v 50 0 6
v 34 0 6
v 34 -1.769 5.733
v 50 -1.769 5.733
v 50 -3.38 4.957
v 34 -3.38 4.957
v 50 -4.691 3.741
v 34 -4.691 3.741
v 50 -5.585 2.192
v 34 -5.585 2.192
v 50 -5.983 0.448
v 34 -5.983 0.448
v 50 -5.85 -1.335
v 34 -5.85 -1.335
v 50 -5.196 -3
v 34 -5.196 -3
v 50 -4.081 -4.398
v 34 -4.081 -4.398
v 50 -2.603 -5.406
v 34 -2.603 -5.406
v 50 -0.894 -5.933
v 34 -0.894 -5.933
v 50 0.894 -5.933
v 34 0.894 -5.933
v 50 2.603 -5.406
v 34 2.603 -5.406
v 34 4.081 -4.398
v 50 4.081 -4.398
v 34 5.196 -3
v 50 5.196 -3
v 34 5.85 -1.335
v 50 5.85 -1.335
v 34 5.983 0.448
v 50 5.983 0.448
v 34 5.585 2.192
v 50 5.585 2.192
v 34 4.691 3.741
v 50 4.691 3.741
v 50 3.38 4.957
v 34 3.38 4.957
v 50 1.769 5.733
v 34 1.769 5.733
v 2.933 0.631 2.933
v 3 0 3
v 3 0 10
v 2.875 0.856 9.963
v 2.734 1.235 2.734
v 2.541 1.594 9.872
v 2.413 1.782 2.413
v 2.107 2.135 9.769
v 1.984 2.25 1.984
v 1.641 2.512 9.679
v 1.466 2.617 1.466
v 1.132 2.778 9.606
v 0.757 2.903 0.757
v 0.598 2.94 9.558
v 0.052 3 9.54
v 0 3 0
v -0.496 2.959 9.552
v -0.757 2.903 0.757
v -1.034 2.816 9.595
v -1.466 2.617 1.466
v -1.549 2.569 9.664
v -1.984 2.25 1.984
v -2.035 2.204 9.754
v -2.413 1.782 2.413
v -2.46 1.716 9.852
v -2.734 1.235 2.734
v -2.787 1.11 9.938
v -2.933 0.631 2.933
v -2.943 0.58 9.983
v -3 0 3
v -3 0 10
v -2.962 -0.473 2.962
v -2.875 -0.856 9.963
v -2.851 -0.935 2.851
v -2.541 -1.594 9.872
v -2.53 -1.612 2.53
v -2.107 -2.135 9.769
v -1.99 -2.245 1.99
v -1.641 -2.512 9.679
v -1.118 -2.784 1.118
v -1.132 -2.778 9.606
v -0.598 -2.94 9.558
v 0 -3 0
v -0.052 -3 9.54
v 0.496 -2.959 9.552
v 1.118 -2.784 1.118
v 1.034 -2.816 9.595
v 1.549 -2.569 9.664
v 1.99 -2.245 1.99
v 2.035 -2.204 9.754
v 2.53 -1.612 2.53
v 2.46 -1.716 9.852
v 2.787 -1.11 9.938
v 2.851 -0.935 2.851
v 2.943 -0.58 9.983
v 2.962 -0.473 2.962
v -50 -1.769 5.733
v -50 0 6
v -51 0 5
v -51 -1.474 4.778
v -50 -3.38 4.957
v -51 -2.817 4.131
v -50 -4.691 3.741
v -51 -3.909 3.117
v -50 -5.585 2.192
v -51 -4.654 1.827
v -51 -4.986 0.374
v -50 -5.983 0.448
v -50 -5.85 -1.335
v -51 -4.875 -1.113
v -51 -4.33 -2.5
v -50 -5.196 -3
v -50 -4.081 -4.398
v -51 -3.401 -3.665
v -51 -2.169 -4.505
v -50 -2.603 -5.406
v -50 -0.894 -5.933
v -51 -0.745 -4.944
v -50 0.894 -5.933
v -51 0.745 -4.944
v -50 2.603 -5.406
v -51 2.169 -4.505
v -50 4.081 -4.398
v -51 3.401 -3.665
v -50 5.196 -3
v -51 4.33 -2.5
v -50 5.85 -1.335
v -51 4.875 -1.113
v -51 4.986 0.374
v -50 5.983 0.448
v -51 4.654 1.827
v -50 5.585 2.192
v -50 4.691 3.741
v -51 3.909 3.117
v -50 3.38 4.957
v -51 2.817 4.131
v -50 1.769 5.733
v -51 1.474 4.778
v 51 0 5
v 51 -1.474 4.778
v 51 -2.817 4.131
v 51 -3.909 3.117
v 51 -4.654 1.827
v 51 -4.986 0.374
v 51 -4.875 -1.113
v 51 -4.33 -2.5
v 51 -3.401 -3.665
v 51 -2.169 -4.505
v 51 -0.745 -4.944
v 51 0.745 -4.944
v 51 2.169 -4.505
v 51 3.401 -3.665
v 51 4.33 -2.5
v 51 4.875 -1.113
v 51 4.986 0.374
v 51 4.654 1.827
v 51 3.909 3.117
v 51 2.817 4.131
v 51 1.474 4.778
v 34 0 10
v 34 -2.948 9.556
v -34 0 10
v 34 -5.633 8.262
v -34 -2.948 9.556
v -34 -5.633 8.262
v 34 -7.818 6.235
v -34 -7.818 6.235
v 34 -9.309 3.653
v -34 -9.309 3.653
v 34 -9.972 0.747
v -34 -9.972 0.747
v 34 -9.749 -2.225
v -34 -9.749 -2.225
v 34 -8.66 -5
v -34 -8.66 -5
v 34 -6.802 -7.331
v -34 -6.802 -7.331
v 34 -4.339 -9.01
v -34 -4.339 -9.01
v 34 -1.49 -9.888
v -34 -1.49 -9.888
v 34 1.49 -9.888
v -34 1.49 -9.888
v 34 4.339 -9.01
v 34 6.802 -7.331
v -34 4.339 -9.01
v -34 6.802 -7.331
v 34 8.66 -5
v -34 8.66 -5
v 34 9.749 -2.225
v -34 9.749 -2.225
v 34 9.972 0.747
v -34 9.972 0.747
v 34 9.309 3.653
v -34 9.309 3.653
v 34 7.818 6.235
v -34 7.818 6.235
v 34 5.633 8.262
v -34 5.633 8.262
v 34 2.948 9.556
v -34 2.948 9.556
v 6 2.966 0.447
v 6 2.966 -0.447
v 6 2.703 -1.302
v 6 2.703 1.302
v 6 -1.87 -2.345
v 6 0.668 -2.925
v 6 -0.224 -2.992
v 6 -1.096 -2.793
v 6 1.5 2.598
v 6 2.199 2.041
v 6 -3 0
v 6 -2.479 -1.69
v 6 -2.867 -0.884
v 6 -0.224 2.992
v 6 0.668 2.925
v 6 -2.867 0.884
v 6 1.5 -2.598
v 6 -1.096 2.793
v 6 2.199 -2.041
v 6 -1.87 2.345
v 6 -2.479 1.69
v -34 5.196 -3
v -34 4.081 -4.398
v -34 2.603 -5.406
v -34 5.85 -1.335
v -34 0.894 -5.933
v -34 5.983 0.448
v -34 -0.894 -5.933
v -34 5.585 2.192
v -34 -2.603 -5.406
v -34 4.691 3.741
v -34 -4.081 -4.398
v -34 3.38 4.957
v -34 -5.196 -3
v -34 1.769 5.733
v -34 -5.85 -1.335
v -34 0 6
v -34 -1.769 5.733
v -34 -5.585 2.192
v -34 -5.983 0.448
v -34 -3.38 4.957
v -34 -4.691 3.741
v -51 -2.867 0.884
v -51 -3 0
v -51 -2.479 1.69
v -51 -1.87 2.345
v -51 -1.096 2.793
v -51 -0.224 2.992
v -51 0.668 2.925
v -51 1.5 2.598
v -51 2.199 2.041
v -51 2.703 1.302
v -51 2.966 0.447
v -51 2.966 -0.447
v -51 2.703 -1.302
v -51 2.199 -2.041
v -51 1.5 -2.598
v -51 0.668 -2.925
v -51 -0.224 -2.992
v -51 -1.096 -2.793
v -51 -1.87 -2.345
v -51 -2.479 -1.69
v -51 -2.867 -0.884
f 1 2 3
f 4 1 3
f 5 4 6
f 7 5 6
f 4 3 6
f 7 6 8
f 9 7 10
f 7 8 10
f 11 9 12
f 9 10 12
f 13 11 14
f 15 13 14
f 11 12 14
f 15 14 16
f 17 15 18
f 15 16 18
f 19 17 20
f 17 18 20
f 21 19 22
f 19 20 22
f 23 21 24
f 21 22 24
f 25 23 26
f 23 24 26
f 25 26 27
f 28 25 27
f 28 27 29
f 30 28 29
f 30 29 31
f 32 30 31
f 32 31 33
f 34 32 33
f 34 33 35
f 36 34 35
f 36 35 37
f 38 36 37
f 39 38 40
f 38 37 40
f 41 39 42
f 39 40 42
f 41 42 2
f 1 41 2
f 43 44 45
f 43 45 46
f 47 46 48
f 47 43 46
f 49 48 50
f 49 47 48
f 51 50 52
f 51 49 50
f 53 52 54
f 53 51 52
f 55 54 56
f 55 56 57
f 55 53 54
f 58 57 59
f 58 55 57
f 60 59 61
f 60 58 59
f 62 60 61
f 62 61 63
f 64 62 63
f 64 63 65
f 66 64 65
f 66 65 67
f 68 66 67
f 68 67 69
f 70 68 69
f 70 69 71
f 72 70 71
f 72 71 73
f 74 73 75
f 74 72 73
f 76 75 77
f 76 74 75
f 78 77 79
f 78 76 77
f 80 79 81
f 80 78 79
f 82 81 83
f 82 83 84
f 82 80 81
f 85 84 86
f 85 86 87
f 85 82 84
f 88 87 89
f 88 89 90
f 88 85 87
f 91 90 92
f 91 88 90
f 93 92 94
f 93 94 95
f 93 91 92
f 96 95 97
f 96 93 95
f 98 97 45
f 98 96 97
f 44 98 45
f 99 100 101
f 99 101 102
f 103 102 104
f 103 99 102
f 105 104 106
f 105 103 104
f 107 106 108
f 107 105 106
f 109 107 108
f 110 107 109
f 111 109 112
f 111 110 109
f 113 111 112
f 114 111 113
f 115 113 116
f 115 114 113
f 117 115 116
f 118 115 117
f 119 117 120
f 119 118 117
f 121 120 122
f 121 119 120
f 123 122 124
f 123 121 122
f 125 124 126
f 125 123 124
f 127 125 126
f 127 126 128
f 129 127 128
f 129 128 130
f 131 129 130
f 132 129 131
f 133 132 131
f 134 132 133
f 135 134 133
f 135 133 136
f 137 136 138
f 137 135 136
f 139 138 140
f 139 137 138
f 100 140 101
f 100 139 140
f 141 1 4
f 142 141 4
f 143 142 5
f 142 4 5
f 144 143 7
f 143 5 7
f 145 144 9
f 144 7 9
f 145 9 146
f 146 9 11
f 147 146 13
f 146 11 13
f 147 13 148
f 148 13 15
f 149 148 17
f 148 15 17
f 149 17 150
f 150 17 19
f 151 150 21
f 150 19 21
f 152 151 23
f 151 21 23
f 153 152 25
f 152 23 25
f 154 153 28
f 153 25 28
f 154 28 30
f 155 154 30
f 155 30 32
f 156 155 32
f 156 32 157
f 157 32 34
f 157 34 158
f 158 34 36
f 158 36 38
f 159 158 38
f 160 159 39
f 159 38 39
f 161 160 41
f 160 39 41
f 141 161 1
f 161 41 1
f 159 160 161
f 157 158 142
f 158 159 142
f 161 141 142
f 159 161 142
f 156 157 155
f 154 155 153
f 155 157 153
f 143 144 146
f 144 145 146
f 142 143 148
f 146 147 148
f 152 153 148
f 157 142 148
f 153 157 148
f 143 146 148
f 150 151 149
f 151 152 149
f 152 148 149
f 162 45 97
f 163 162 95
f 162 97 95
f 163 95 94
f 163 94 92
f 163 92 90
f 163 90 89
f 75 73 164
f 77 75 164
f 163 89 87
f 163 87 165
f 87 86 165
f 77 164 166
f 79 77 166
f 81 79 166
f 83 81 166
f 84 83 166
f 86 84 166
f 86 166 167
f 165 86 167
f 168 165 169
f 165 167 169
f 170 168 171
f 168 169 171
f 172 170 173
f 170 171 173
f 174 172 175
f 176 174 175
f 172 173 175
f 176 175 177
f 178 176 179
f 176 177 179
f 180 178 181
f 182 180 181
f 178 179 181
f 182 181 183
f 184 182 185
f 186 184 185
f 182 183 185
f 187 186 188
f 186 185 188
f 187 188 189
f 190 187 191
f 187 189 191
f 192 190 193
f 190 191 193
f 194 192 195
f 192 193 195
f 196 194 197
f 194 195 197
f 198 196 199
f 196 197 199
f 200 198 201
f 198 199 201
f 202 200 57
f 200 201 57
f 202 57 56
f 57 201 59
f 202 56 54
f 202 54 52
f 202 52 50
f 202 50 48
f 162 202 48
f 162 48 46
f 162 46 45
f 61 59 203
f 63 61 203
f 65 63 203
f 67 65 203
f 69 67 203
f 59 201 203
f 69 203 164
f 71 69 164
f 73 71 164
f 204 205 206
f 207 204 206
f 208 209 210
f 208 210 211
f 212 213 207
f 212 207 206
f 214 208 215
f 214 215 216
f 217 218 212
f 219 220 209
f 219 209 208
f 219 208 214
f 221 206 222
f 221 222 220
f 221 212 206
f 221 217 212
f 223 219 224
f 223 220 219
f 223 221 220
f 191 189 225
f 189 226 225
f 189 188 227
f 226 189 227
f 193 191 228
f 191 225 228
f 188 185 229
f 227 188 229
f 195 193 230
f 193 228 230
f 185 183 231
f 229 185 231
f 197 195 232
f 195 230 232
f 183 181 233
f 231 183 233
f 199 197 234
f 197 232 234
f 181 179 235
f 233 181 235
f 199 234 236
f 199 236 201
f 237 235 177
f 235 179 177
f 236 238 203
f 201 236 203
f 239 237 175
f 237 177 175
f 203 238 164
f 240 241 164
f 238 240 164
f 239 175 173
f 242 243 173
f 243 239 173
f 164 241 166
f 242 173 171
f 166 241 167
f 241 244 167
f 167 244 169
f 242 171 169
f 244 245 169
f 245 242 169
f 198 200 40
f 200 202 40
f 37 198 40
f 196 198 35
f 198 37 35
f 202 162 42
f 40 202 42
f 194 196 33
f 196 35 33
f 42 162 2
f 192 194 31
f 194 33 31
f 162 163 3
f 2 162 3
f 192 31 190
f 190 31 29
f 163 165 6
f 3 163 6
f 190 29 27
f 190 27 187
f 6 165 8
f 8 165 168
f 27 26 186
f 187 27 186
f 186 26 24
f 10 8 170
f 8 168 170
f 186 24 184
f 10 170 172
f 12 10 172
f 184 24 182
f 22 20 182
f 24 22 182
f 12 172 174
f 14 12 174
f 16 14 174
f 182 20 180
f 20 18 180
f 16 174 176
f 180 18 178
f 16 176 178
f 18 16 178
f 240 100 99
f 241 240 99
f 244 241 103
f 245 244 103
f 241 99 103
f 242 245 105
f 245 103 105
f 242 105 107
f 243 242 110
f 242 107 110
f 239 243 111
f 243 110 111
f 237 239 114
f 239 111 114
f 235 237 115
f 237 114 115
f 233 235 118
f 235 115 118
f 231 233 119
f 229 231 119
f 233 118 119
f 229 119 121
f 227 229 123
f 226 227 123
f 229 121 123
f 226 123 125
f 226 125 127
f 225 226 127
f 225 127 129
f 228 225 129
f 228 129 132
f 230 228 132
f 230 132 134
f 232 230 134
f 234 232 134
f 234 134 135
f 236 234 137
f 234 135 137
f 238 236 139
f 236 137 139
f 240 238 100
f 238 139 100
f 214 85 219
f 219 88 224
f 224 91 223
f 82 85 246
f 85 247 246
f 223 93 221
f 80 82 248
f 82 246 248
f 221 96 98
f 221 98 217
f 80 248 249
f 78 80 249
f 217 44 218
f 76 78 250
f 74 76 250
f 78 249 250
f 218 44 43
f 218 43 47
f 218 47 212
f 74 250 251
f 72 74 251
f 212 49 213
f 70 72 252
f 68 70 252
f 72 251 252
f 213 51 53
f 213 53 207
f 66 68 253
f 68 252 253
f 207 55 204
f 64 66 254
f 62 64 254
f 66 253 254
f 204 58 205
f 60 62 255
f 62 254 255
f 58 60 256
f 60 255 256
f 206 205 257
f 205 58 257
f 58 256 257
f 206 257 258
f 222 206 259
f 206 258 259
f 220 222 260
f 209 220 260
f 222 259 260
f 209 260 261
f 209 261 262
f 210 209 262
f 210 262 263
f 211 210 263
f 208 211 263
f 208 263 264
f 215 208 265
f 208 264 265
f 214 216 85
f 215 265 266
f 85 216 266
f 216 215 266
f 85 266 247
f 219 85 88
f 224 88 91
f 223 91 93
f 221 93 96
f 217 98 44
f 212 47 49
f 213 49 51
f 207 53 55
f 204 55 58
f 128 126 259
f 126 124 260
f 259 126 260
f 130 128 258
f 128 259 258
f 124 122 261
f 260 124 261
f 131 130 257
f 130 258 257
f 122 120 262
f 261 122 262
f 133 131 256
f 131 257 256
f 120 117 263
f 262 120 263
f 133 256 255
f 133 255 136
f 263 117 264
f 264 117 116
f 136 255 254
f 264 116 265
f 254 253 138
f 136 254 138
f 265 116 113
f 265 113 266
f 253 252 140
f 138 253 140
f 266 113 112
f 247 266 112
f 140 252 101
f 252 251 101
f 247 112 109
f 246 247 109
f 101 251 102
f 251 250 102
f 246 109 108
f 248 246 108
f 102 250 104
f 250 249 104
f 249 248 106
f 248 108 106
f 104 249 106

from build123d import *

# Parameters (mm, degrees)
F2_SIZE  = 1
F3_R     = 3
F4_DEPTH = 57
F5_R     = 3
F6_DEPTH = 32


with BuildPart() as f1:
    # F0 (on Front) → F1 (revolve)
    with BuildSketch(Plane.XZ):
        Polygon((-51, 6), (-51, 0), (51, 0), (51, 6), (34, 6), (34, 10), (-34, 10), (-34, 6), align=None)
    revolve(axis=Axis((0, 0, 0), (1, 0, 0)))

    # F2
    f2_edges = [f1.edges().sort_by_distance(p)[0] for p in [
        (51, 0, -6),
        (-51, 0, -6),
    ]]
    chamfer(f2_edges, length=F2_SIZE)

    # F3 (on face) → F4 (cut)
    with BuildSketch(Plane(origin=(-51, 0, 0), x_dir=(0, -1, 0), z_dir=(-1, 0, 0))):
        Circle(F3_R)
    extrude(amount=-F4_DEPTH, mode=Mode.SUBTRACT)

    # F5 (on Top) → F6 (cut)
    with BuildSketch(Plane.XY):
        Circle(F5_R)
    extrude(amount=F6_DEPTH, mode=Mode.SUBTRACT)


solid = f1.part
